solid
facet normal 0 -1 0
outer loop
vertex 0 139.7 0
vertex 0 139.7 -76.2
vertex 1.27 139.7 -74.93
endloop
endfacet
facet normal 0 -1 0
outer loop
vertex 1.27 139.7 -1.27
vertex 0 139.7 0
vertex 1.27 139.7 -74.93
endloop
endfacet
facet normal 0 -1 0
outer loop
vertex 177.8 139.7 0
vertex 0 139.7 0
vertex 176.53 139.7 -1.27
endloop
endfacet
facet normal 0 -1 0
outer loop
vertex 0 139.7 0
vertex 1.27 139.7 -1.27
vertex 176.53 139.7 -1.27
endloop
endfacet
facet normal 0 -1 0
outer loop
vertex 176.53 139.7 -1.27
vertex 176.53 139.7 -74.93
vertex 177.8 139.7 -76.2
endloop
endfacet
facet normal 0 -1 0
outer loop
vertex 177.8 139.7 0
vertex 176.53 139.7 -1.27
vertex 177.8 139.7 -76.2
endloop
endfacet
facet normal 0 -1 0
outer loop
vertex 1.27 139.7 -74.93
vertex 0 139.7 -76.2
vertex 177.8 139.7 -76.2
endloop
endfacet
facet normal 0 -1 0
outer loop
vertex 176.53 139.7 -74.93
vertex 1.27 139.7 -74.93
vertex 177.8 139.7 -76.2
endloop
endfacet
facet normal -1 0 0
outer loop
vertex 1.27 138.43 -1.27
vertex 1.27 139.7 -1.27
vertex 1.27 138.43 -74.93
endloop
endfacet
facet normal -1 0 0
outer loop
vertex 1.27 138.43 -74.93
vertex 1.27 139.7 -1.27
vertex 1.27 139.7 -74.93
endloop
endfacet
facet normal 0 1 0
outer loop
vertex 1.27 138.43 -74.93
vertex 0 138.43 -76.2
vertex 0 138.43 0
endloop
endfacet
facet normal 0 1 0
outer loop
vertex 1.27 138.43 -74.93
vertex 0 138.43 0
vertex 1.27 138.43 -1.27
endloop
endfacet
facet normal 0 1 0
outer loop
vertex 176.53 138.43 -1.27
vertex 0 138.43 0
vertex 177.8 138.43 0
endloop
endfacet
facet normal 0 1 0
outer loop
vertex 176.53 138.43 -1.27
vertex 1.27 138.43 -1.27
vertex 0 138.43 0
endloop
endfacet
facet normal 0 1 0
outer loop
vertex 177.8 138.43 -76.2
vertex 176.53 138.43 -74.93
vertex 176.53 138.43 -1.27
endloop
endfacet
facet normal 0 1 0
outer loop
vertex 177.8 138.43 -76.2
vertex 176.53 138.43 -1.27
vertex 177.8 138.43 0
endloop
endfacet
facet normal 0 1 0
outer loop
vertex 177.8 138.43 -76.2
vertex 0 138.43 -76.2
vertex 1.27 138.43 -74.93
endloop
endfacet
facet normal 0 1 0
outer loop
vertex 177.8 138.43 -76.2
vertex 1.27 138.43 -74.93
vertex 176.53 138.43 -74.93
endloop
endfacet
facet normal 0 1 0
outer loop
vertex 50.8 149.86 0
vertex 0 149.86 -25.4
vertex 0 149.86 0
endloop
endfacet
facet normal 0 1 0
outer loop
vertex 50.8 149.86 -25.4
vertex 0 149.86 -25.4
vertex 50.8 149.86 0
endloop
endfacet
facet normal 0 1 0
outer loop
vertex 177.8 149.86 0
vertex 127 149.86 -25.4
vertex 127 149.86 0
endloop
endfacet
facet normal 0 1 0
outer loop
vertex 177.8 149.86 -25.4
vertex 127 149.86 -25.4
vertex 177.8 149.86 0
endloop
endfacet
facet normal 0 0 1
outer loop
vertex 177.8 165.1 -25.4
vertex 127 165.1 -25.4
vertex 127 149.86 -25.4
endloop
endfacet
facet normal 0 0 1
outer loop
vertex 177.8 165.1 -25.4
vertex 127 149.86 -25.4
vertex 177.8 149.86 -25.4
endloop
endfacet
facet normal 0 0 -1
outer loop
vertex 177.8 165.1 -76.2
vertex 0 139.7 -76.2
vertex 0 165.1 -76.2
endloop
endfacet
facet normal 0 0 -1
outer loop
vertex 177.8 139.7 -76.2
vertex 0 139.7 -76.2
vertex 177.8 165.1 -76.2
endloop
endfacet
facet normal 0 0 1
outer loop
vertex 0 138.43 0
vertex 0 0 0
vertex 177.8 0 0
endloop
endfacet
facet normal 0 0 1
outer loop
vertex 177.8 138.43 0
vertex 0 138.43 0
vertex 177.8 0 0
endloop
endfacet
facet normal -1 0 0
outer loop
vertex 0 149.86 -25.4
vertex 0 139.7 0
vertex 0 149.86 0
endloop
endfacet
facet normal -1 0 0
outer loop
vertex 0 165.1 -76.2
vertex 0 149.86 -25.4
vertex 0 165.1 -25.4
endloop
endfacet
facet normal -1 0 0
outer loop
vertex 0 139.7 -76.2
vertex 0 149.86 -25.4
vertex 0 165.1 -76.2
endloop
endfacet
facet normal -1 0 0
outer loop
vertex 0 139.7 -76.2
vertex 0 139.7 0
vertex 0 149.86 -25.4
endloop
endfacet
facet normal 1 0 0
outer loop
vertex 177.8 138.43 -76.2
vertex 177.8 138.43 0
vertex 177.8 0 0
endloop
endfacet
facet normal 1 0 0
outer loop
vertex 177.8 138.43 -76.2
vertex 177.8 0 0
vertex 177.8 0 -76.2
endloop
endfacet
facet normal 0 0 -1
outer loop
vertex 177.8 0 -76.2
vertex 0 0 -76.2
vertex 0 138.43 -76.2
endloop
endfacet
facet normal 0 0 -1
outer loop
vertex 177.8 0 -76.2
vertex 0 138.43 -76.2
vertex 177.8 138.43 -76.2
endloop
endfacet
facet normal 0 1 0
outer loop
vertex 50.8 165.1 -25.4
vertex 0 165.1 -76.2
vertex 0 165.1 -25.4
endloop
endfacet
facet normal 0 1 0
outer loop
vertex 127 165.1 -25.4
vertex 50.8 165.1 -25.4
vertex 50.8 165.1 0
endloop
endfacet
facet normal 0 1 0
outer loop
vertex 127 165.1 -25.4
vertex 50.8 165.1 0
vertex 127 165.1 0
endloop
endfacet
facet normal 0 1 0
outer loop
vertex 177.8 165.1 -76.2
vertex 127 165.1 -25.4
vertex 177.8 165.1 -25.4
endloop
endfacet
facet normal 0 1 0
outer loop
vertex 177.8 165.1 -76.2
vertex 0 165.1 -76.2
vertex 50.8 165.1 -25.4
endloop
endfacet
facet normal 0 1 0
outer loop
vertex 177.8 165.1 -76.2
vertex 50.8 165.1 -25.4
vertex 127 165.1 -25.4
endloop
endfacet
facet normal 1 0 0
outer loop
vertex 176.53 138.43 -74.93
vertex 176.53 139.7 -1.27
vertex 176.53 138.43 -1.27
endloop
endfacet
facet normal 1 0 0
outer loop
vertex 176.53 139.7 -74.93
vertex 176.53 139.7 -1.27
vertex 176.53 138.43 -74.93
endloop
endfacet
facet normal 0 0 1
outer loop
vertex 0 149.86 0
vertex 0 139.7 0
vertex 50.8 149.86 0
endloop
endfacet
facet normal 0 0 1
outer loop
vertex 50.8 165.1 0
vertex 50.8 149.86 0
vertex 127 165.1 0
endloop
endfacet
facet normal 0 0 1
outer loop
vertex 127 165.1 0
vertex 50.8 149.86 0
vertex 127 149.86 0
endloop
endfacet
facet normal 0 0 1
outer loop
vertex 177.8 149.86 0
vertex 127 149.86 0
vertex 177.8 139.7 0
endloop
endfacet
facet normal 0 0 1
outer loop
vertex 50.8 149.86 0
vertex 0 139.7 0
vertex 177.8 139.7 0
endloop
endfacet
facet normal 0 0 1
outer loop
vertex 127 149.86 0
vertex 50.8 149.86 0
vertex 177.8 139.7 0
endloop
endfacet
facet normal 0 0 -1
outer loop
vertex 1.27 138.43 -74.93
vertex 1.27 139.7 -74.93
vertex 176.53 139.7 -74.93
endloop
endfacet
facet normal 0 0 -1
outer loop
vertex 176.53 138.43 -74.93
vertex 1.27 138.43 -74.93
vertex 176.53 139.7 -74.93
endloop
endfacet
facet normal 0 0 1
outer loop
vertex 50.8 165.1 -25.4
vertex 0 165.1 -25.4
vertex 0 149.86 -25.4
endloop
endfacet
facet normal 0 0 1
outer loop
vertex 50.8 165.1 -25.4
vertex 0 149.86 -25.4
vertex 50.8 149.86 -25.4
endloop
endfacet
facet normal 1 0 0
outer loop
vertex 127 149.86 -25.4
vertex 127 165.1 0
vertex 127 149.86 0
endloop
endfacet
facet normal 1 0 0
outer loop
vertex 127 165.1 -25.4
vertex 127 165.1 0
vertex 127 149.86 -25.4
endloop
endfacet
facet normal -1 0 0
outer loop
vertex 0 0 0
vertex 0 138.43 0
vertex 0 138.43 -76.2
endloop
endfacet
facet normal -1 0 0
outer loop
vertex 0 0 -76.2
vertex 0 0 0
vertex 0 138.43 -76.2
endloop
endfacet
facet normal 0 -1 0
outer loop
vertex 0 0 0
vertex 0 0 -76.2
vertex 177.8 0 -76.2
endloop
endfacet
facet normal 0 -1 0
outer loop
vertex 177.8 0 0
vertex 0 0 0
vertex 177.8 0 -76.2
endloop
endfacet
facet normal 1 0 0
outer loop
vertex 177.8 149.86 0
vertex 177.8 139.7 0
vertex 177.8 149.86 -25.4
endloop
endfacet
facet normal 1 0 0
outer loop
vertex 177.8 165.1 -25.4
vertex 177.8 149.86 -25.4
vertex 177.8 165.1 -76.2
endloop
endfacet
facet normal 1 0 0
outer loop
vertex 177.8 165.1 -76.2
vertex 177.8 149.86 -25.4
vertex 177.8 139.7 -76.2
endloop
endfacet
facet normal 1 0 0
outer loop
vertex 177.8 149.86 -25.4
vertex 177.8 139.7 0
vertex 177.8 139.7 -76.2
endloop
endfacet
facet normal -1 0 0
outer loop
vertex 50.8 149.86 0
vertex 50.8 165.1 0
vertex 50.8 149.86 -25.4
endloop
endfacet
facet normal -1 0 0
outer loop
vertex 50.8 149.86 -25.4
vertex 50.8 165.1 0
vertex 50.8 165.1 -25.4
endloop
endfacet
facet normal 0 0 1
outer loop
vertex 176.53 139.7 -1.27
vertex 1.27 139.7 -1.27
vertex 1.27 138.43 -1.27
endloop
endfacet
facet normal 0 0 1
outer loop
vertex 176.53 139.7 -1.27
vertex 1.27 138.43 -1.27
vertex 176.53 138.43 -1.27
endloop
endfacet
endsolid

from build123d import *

# Parameters (mm, degrees)
SKETCH1_W           = 177.8
SKETCH1_H           = 76.2
BOSS_EXTRUDE1_DEPTH = 165.1
SKETCH2_W           = 50.8
SKETCH2_H           = 25.4
CUT_EXTRUDE1_DEPTH  = 15.24
SKETCH3_W           = 177.8
SKETCH3_H           = 76.2
SKETCH3_W_2         = 175.26
SKETCH3_H_2         = 73.66
CUT_EXTRUDE2_DEPTH  = 1.27


with BuildPart() as part:
    # Sketch1 → Boss-Extrude1 (new body)
    with BuildSketch(Plane(origin=(0, 0, 0), x_dir=(1, 0, 0), z_dir=(0, 1, 0))):
        with Locations((88.9, 38.1)):
            Rectangle(SKETCH1_W, SKETCH1_H)
    extrude(amount=BOSS_EXTRUDE1_DEPTH)

    # Sketch2 → Cut-Extrude1 (cut)
    with BuildSketch(Plane(origin=(0, 165.1, 0), x_dir=(1, 0, 0), z_dir=(0, 1, 0))):
        with Locations((25.4, 12.7)):
            Rectangle(SKETCH2_W, SKETCH2_H)
        with Locations((152.4, 12.7)):
            Rectangle(SKETCH2_W, SKETCH2_H)
    extrude(amount=-CUT_EXTRUDE1_DEPTH, mode=Mode.SUBTRACT)

    # Sketch3 → Cut-Extrude2 (cut)
    with BuildSketch(Plane(origin=(0, 139.7, 0), x_dir=(1, 0, 0), z_dir=(0, 1, 0))):
        with Locations((88.9, 38.1)):
            Rectangle(SKETCH3_W, SKETCH3_H)
        with Locations((88.9, 38.1)):
            Rectangle(SKETCH3_W_2, SKETCH3_H_2, mode=Mode.SUBTRACT)
    extrude(amount=-CUT_EXTRUDE2_DEPTH, mode=Mode.SUBTRACT)


solid = part.part
